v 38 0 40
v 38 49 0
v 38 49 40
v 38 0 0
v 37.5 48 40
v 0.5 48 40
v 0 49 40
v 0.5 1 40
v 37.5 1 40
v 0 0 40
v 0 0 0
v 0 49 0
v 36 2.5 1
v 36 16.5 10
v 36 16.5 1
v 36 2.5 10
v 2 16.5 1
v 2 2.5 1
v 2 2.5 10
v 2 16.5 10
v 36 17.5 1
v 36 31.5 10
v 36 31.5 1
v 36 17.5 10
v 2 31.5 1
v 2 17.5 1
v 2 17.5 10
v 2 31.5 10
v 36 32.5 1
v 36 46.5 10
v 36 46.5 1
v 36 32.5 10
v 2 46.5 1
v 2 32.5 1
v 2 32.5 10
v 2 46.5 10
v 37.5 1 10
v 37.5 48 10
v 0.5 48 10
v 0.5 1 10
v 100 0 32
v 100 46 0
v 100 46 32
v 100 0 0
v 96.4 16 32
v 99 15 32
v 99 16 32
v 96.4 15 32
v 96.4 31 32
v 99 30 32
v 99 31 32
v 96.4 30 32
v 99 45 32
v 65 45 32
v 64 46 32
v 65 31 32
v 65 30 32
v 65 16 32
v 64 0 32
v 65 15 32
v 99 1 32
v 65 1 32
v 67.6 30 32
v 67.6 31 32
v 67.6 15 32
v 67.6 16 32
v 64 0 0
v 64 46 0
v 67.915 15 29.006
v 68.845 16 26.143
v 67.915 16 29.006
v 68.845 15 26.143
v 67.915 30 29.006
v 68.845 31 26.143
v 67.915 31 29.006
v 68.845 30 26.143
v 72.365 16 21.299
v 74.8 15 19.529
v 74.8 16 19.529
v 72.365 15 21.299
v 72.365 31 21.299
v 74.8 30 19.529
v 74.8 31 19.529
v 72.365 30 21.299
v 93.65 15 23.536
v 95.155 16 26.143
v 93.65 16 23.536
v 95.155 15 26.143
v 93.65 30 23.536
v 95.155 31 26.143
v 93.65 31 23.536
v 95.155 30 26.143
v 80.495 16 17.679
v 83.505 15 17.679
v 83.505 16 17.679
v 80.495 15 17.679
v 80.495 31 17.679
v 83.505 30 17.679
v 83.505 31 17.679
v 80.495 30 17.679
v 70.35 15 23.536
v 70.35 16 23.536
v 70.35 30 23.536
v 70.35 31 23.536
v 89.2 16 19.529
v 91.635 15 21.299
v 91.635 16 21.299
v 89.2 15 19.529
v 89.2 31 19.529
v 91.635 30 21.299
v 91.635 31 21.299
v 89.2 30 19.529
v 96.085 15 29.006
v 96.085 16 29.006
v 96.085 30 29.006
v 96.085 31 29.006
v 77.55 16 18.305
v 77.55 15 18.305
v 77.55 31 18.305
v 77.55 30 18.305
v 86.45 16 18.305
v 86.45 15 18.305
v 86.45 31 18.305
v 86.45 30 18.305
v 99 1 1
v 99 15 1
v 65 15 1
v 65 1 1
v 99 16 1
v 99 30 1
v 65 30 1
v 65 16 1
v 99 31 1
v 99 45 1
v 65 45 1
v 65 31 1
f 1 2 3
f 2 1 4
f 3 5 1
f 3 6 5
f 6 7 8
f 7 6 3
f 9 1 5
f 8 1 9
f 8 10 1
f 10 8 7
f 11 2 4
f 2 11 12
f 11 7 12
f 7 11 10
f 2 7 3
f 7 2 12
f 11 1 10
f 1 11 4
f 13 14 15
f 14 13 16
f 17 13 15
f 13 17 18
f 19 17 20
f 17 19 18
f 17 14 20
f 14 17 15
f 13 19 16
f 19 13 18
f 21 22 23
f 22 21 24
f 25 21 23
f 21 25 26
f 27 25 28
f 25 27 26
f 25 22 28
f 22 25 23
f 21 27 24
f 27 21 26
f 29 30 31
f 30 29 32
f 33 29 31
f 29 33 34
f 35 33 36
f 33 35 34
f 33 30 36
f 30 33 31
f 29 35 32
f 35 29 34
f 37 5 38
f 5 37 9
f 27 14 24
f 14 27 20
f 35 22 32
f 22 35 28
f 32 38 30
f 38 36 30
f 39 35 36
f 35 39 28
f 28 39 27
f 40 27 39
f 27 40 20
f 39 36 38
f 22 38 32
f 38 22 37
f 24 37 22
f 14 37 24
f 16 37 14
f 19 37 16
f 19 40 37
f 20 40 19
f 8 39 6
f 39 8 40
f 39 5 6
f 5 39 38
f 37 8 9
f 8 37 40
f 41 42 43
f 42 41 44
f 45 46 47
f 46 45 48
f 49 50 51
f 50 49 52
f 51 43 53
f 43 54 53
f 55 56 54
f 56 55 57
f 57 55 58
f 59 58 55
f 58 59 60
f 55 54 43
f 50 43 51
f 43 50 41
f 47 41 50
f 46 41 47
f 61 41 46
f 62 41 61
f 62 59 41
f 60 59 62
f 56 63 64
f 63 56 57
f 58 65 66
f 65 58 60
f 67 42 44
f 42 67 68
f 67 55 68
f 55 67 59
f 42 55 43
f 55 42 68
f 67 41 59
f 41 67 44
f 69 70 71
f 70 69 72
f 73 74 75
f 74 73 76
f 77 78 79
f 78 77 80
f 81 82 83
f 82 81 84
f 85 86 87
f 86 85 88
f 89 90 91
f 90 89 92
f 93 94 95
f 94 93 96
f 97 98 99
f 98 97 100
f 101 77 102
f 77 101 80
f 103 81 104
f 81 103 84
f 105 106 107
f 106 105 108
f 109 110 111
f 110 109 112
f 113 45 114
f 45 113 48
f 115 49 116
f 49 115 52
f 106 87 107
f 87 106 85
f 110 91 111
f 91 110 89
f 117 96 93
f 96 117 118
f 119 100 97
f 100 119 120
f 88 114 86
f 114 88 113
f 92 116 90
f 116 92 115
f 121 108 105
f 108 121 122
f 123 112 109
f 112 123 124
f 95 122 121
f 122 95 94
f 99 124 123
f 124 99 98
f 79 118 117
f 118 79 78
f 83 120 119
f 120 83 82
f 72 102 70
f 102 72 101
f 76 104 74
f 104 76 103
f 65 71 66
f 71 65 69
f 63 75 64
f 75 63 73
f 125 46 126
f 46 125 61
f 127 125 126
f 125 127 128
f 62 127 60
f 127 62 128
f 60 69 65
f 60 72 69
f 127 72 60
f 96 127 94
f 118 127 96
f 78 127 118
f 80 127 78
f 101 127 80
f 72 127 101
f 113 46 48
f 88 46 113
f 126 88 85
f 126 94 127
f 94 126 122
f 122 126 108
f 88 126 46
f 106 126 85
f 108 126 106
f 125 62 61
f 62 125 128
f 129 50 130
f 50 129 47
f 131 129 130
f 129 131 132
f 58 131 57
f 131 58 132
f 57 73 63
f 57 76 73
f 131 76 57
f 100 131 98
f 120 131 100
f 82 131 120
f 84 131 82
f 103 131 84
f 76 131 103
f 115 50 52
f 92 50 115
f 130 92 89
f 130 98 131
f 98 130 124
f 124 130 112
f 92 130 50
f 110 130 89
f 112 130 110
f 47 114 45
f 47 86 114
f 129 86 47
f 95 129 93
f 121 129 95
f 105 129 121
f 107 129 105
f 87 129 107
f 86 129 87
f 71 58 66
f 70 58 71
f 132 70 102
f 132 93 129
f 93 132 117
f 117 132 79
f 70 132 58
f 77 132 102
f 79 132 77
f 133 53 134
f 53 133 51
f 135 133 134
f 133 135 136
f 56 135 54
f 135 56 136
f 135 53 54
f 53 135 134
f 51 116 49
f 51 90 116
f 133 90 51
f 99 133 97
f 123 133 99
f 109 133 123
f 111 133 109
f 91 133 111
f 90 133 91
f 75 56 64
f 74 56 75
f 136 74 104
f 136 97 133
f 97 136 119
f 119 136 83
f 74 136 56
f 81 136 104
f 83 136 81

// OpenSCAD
/* [Dimensions] */
// Batteries Measures of 34x14x42 mm for GoPro10
// Battery depth
BATDEPTH = 14;// [10:20]
// Battery width
WIDTH = 34;//[10:60]
// Thickness of walls
THICK = 1; //[1:4]
// height of top/bottom
HEIGHT = 40; //[20:50]
// Number of batteries
BATTERY_NO = 3;//[1:8]

// Create TOP
CREATE_TOP = true;//[false:true]
// Create Bottom
CREATE_BOTTOM = true;//[false:true]

// -----------------------------
// Define Modules
// -----------------------------

module body(width, length, heigth, thickness){
difference() {
cube([width,length,heigth]);//Base
//translate([0,01,0])
    


//translate([THICK,THICK,THICK])cube([34,14,42]);
//translate([THICK,THICK+16,THICK])cube([34,14,42]);
//translate([THICK,THICK+16+16,THICK])cube([34,14,42]);

//Middle Cut Out
translate([width/2,(length/2),heigth])scale([01,1.2])rotate([90,0,0])cylinder(  length/1.5, d=width*0.8, center=true);
    }
}

module batterys(number, thick, width, depth, height){
    for (i = [0 : number-1]){
        translate([thick,thick+(i*(thick+depth)),thick])cube([width,depth,height]);
        }
    }

// -----------------------------
// Put Components together
// -----------------------------

// Top Part
if (CREATE_TOP == true){
difference() {
body(WIDTH+4*THICK,4*THICK+BATTERY_NO*(BATDEPTH+THICK),HEIGHT,THICK);

// Batteries Measures of 34x14x42 mm for GoPro10
translate([THICK,THICK*1.5,0])batterys(BATTERY_NO, THICK, WIDTH,BATDEPTH,42);    

// Outer-Joint    
translate([THICK*0.5,THICK*1.0,HEIGHT/4])cube([WIDTH+THICK*3,THICK*2+BATTERY_NO*(BATDEPTH+THICK),HEIGHT-THICK]);
    }
}

// Buttom Part
if (CREATE_BOTTOM == true){

translate([WIDTH+30,(0),0])difference() {
body(WIDTH+2*THICK,THICK+BATTERY_NO*(BATDEPTH+THICK),HEIGHT*4/5,THICK);

// Batteries Measures of 34x14x42 mm for GoPro10
batterys(BATTERY_NO, THICK, WIDTH,BATDEPTH,HEIGHT);    

}
   }
